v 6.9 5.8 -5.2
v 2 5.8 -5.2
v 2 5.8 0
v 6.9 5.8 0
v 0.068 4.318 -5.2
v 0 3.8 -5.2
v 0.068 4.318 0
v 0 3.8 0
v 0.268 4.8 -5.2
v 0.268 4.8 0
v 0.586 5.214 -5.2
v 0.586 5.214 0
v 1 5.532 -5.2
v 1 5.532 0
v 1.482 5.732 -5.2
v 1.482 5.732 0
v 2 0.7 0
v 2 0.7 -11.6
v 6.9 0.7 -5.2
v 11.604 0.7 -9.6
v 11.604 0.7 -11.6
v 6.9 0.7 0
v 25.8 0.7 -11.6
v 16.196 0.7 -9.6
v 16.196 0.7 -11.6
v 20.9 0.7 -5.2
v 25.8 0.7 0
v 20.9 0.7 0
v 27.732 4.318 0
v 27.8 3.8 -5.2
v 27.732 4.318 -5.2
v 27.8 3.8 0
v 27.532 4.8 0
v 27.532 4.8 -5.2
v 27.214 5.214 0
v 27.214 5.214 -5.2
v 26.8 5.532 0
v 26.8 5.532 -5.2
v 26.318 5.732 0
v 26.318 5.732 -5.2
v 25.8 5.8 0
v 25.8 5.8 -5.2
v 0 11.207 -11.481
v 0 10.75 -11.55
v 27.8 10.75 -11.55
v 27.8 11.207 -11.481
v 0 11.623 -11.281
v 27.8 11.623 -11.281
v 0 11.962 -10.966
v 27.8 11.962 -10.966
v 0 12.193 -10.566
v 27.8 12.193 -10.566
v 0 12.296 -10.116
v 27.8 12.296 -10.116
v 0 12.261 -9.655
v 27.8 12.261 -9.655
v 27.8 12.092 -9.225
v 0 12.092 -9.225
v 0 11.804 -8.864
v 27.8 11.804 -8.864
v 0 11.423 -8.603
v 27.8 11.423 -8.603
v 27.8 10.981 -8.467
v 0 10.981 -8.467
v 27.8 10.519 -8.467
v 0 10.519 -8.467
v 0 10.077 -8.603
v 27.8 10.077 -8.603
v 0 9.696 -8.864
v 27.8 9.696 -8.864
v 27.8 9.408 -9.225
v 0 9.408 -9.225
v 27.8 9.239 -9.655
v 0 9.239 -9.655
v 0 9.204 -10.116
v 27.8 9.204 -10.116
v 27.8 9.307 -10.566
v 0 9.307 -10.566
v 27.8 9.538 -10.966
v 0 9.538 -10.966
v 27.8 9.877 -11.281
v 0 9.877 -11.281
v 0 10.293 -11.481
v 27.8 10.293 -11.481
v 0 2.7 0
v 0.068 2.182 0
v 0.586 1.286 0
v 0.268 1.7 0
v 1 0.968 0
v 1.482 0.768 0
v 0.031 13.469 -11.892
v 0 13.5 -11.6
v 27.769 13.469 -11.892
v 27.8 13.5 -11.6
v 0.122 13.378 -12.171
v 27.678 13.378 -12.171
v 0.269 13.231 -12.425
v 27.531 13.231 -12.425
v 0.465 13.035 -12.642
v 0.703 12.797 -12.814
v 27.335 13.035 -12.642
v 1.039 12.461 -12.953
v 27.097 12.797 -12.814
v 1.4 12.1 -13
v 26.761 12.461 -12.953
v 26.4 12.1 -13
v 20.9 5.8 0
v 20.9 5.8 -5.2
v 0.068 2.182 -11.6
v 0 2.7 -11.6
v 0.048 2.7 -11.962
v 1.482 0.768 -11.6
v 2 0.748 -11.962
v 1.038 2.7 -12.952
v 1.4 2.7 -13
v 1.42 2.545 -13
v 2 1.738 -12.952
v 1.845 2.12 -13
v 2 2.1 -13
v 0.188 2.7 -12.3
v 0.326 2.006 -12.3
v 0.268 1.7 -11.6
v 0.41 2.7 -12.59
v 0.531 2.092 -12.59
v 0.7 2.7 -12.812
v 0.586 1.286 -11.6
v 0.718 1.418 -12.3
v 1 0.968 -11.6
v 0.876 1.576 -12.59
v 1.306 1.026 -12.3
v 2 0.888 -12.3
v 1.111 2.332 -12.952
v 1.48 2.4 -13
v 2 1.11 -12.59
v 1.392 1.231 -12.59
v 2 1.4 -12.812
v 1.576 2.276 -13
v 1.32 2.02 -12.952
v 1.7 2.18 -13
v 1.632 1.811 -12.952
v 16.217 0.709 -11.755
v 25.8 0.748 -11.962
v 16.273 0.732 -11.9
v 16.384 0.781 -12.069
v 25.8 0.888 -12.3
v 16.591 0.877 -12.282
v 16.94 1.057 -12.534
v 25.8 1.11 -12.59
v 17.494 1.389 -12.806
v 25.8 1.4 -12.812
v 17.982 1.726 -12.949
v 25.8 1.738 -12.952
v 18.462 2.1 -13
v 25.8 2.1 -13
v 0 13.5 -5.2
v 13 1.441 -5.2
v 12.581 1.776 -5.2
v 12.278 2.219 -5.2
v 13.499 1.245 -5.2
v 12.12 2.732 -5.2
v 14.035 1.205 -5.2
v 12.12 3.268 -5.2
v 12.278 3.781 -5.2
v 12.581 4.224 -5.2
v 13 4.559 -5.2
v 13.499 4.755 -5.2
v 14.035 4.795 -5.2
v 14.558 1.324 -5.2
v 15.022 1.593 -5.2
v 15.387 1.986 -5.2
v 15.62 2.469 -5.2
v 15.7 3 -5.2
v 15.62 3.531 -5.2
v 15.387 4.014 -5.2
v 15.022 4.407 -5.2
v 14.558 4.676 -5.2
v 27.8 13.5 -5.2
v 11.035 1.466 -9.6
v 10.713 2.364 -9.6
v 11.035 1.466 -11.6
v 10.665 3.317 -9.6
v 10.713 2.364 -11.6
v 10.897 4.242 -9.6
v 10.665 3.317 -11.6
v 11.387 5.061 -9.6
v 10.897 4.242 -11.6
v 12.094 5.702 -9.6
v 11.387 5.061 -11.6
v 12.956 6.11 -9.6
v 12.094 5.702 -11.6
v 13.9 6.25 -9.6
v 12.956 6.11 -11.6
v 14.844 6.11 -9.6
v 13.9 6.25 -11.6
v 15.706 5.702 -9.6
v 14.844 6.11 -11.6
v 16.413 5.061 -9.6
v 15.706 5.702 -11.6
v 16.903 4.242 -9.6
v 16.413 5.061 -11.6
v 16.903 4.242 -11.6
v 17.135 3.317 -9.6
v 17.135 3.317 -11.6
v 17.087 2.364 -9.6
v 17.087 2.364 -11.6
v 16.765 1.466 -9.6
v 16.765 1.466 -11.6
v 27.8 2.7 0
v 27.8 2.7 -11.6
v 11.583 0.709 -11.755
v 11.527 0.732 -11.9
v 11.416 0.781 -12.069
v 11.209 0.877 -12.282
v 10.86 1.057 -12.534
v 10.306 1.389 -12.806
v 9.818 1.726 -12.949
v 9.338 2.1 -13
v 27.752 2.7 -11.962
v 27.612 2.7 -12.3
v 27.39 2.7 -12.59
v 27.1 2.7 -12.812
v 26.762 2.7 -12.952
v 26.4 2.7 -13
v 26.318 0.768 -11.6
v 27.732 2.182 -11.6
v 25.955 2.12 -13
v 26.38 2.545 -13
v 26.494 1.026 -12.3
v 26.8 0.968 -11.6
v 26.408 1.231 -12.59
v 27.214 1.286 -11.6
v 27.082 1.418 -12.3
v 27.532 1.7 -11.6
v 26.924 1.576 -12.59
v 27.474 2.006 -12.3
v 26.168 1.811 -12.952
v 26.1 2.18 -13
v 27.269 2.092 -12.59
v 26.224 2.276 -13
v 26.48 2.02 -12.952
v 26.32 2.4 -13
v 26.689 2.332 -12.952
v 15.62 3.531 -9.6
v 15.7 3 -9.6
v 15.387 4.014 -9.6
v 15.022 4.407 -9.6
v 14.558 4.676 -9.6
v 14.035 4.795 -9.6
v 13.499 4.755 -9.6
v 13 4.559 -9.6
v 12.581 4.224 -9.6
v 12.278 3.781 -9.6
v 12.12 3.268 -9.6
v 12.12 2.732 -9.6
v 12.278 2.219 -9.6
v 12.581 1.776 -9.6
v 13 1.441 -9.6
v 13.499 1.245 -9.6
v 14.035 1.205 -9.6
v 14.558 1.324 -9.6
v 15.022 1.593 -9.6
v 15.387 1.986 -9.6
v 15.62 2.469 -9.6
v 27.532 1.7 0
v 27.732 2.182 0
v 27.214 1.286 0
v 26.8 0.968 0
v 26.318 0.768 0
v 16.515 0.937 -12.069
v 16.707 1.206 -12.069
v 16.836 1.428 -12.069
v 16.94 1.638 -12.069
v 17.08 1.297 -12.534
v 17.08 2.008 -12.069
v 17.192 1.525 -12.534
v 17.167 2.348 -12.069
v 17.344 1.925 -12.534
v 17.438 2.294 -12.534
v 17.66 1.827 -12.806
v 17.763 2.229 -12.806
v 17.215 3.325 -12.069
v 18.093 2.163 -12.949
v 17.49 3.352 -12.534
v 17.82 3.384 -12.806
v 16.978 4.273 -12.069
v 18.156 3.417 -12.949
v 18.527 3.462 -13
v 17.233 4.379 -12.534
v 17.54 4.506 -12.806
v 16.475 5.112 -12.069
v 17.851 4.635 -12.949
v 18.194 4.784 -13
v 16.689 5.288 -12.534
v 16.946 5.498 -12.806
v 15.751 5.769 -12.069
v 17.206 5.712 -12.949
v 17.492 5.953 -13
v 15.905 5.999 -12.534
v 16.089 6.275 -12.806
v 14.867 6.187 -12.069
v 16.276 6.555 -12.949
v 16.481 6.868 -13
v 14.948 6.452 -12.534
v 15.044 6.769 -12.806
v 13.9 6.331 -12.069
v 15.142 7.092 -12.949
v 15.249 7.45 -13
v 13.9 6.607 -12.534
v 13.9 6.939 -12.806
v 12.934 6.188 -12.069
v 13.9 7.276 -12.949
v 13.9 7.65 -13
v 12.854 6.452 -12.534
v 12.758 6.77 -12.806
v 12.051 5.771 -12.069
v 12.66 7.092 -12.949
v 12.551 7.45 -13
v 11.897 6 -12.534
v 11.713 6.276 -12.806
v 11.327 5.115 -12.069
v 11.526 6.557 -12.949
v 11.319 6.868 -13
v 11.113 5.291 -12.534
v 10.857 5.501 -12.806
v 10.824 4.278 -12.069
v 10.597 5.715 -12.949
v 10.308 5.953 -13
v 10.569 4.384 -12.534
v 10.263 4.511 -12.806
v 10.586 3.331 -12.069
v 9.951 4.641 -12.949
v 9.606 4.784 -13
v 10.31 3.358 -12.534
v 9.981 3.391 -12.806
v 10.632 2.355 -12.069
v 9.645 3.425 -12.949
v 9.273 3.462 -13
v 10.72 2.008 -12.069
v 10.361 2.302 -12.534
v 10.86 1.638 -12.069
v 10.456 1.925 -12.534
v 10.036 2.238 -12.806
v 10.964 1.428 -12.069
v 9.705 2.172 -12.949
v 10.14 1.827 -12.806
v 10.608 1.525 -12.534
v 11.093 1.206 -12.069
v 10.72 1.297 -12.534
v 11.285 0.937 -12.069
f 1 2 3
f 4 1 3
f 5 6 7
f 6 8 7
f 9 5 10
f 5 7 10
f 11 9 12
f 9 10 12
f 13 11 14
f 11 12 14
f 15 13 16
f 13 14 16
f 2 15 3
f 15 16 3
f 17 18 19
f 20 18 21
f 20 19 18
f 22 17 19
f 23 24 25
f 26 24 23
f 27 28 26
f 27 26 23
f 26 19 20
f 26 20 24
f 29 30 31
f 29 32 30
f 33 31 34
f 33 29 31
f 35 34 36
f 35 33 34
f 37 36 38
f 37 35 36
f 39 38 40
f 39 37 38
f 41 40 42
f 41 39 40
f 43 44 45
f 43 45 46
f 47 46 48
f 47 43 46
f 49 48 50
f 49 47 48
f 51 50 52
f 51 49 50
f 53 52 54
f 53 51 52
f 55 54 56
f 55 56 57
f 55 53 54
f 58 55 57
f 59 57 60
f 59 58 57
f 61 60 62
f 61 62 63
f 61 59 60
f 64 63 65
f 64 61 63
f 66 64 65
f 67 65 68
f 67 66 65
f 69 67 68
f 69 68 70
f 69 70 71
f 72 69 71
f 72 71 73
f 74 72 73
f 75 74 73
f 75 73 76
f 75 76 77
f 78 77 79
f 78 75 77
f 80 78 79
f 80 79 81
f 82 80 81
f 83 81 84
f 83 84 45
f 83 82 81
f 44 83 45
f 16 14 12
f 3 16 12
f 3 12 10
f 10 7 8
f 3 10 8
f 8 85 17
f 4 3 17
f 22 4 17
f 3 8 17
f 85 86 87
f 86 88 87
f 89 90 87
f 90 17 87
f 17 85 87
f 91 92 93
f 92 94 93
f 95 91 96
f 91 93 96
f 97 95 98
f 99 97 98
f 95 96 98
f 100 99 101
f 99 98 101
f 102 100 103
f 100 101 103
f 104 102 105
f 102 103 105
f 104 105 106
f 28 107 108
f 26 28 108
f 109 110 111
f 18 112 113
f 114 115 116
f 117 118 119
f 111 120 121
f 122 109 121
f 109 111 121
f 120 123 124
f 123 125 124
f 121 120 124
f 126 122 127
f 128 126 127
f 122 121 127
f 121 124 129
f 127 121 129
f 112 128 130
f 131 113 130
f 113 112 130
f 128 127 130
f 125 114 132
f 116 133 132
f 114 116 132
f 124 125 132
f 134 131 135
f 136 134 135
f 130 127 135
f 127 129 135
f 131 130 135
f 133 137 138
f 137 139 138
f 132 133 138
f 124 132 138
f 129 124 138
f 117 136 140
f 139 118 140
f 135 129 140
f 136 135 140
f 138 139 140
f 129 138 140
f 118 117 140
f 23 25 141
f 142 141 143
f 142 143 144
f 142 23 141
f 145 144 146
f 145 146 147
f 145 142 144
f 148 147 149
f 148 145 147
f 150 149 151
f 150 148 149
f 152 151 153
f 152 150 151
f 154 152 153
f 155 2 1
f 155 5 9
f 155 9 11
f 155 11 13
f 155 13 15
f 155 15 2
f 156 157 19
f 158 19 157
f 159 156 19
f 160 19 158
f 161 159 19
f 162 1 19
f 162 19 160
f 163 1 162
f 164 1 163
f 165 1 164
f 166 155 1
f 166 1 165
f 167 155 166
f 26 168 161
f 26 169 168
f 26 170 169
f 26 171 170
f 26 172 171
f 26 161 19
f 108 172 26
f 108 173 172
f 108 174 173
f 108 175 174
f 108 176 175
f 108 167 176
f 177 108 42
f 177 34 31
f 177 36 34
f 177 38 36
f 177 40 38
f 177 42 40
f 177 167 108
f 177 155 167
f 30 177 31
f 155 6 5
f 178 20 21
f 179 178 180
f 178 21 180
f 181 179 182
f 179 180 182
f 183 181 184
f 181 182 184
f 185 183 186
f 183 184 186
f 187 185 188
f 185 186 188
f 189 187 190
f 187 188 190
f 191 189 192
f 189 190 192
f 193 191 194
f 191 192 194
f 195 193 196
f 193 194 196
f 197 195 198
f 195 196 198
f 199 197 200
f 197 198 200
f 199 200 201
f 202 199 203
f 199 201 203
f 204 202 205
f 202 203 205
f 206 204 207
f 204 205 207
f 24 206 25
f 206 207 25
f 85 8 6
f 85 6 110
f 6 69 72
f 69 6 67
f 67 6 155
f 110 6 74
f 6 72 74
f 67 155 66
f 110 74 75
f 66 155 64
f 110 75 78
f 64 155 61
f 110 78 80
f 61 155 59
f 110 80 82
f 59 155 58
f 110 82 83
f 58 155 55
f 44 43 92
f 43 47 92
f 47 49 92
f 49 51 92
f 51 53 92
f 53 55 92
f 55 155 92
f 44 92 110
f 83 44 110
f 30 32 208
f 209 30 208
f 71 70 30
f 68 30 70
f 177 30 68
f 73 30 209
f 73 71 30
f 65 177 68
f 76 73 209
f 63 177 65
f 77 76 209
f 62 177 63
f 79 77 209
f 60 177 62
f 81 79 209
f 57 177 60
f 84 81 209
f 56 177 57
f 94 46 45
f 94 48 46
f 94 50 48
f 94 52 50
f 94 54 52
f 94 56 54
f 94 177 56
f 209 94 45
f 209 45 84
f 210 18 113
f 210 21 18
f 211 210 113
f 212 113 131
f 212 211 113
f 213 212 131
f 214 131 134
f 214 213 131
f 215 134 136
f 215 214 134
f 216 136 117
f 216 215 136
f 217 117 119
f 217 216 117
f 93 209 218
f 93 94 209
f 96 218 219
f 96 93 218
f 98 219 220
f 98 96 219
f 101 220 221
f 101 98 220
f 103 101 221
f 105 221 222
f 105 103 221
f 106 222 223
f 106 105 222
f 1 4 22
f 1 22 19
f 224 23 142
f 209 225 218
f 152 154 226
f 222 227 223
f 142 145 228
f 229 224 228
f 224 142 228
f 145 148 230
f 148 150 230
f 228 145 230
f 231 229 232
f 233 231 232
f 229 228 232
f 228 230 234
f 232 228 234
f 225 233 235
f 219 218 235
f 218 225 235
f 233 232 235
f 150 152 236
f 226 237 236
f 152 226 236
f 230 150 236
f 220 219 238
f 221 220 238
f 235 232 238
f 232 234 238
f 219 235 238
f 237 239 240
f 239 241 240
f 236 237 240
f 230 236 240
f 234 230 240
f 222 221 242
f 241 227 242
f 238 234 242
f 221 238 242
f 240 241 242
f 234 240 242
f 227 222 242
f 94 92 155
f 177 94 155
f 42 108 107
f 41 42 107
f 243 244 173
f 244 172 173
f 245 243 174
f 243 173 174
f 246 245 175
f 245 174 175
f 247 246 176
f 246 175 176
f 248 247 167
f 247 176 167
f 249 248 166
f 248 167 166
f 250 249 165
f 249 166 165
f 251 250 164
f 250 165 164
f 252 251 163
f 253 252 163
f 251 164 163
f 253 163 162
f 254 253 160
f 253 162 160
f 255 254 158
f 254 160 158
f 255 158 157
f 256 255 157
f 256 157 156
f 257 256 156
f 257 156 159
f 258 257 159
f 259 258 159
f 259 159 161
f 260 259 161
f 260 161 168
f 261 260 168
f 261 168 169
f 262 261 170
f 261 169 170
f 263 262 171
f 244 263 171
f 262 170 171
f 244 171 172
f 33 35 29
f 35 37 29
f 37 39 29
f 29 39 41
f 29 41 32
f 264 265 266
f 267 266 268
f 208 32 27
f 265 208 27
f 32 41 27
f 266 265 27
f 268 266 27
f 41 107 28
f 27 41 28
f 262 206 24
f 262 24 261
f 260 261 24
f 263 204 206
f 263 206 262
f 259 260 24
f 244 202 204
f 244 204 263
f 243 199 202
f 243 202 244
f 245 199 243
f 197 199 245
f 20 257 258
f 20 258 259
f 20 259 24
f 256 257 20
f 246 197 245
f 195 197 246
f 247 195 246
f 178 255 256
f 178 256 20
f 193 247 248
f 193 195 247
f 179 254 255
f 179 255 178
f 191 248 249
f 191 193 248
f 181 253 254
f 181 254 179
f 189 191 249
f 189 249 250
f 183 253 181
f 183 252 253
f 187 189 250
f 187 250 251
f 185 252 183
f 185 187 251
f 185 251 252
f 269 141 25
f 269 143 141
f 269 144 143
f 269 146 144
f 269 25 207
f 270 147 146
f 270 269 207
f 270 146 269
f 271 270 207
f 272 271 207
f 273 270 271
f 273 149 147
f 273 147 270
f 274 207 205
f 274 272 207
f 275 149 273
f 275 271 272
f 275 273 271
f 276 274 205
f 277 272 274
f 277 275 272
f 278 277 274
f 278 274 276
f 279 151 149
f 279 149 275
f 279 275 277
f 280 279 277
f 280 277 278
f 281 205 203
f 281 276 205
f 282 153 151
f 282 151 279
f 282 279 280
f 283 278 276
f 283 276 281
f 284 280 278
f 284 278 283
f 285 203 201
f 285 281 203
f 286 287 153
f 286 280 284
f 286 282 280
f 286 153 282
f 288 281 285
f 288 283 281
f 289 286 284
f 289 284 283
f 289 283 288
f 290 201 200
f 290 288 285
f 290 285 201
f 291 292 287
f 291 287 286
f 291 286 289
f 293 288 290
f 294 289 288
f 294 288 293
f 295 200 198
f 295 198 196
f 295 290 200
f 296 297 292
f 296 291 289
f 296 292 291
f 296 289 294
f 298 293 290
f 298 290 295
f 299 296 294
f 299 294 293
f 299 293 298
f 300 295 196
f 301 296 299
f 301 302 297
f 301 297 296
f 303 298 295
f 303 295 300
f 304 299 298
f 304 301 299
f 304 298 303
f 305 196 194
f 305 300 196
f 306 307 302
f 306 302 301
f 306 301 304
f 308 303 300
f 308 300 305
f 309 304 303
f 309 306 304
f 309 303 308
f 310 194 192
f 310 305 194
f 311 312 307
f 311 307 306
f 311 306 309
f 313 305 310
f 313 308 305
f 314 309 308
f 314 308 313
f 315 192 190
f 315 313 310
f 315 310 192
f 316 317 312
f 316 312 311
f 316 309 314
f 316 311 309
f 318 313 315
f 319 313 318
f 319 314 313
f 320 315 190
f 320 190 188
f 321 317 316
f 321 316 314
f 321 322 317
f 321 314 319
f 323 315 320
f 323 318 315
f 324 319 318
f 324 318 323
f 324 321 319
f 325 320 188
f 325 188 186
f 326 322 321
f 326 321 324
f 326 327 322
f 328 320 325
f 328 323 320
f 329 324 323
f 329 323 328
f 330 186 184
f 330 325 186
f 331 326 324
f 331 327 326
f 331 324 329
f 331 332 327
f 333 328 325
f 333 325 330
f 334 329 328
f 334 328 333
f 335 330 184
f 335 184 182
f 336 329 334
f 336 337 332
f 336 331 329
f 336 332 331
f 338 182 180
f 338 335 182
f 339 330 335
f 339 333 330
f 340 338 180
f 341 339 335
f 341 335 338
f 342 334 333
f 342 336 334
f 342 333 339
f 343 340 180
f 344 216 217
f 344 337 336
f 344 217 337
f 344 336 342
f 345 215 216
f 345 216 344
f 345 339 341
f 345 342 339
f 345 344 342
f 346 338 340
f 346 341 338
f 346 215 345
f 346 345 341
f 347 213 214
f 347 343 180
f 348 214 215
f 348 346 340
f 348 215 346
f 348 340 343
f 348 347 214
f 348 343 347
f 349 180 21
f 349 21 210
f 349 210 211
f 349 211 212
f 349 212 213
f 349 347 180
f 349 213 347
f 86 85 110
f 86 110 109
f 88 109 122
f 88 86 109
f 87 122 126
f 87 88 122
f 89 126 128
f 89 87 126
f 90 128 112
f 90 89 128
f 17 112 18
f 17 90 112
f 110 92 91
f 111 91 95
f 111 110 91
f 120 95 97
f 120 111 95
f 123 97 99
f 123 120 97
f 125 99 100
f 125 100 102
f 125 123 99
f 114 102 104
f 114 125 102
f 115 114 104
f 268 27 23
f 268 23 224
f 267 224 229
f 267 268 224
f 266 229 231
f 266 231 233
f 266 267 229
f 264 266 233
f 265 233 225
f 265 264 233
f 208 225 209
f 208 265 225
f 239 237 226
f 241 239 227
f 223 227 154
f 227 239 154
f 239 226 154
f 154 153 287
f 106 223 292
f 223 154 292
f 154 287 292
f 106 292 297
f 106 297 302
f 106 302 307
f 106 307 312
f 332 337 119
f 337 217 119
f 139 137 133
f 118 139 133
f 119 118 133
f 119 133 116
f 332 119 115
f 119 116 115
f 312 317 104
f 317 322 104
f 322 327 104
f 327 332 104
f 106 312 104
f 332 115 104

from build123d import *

# Parameters (mm, degrees)
SKETCH1_R                                           = 1.55
BOSS_EXTRUDE1_DEPTH                                 = 27.8
SKETCH2_W                                           = 14
SKETCH2_H                                           = 5.2
CUT_EXTRUDE1_DEPTH                                  = 6.8
CBORE_FOR_M3_HEX_SOCKET_HEAD_CAP_SCREW1_D           = 3.6
CBORE_FOR_M3_HEX_SOCKET_HEAD_CAP_SCREW1_CBORE_D     = 6.5
CBORE_FOR_M3_HEX_SOCKET_HEAD_CAP_SCREW1_CBORE_DEPTH = 3.4
SKETCH6_W                                           = 27.8
SKETCH6_H                                           = 13
CUT_EXTRUDE2_DEPTH                                  = 0.7
FILLET1_R                                           = 2
FILLET2_R                                           = 1.4


with BuildPart() as part:
    # Sketch1 → Boss-Extrude1 (new body)
    with BuildSketch(Plane(origin=(0, 0, 0), x_dir=(0, 0, -1), z_dir=(1, 0, 0))):
        Polygon((0, 0), (13, 0), (13, 13.5), (5.2, 13.5), (5.2, 5.8), (0, 5.8), align=None)
        with Locations((10, 10.75)):
            Circle(SKETCH1_R, mode=Mode.SUBTRACT)
    extrude(amount=BOSS_EXTRUDE1_DEPTH)

    # Sketch2 → Cut-Extrude1 (cut, through all)
    with BuildSketch(Plane(origin=(0, 5.8, 0), x_dir=(1, 0, 0), z_dir=(0, 1, 0))):
        with Locations((13.9, 2.6)):
            Rectangle(SKETCH2_W, SKETCH2_H)
    extrude(amount=-CUT_EXTRUDE1_DEPTH, mode=Mode.SUBTRACT)

    # CBORE for M3 Hex Socket Head Cap Screw1 (through all)
    with Locations(Plane(origin=(0, 0, -13), x_dir=(-1, 0, 0), z_dir=(0, 0, -1))):
        with Locations((-13.9, 3)):
            CounterBoreHole(CBORE_FOR_M3_HEX_SOCKET_HEAD_CAP_SCREW1_D / 2, CBORE_FOR_M3_HEX_SOCKET_HEAD_CAP_SCREW1_CBORE_D / 2, CBORE_FOR_M3_HEX_SOCKET_HEAD_CAP_SCREW1_CBORE_DEPTH)

    # Sketch6 → Cut-Extrude2 (cut)
    with BuildSketch(Plane.XZ):
        with Locations((13.9, -6.5)):
            Rectangle(SKETCH6_W, SKETCH6_H)
    extrude(amount=-CUT_EXTRUDE2_DEPTH, mode=Mode.SUBTRACT)

    # Fillet1
    fillet1_edges = [part.edges().sort_by_distance(p)[0] for p in [
        (27.8, 5.8, -2.6),
        (0, 0.7, -6.5),
        (27.8, 0.7, -6.5),
        (0, 5.8, -2.6),
    ]]
    fillet(fillet1_edges, radius=FILLET1_R)

    # Fillet2
    fillet2_edges = [part.edges().sort_by_distance(p)[0] for p in [
        (6.80190375, 0.7, -13),
        (0, 8.1, -13),
        (0.585786438, 1.285786438, -13),
        (27.214213562, 1.285786438, -13),
        (13.9, 13.5, -13),
        (13.9, 6.25, -13),
        (20.99809625, 0.7, -13),
        (27.8, 8.1, -13),
    ]]
    fillet(fillet2_edges, radius=FILLET2_R)


solid = part.part
